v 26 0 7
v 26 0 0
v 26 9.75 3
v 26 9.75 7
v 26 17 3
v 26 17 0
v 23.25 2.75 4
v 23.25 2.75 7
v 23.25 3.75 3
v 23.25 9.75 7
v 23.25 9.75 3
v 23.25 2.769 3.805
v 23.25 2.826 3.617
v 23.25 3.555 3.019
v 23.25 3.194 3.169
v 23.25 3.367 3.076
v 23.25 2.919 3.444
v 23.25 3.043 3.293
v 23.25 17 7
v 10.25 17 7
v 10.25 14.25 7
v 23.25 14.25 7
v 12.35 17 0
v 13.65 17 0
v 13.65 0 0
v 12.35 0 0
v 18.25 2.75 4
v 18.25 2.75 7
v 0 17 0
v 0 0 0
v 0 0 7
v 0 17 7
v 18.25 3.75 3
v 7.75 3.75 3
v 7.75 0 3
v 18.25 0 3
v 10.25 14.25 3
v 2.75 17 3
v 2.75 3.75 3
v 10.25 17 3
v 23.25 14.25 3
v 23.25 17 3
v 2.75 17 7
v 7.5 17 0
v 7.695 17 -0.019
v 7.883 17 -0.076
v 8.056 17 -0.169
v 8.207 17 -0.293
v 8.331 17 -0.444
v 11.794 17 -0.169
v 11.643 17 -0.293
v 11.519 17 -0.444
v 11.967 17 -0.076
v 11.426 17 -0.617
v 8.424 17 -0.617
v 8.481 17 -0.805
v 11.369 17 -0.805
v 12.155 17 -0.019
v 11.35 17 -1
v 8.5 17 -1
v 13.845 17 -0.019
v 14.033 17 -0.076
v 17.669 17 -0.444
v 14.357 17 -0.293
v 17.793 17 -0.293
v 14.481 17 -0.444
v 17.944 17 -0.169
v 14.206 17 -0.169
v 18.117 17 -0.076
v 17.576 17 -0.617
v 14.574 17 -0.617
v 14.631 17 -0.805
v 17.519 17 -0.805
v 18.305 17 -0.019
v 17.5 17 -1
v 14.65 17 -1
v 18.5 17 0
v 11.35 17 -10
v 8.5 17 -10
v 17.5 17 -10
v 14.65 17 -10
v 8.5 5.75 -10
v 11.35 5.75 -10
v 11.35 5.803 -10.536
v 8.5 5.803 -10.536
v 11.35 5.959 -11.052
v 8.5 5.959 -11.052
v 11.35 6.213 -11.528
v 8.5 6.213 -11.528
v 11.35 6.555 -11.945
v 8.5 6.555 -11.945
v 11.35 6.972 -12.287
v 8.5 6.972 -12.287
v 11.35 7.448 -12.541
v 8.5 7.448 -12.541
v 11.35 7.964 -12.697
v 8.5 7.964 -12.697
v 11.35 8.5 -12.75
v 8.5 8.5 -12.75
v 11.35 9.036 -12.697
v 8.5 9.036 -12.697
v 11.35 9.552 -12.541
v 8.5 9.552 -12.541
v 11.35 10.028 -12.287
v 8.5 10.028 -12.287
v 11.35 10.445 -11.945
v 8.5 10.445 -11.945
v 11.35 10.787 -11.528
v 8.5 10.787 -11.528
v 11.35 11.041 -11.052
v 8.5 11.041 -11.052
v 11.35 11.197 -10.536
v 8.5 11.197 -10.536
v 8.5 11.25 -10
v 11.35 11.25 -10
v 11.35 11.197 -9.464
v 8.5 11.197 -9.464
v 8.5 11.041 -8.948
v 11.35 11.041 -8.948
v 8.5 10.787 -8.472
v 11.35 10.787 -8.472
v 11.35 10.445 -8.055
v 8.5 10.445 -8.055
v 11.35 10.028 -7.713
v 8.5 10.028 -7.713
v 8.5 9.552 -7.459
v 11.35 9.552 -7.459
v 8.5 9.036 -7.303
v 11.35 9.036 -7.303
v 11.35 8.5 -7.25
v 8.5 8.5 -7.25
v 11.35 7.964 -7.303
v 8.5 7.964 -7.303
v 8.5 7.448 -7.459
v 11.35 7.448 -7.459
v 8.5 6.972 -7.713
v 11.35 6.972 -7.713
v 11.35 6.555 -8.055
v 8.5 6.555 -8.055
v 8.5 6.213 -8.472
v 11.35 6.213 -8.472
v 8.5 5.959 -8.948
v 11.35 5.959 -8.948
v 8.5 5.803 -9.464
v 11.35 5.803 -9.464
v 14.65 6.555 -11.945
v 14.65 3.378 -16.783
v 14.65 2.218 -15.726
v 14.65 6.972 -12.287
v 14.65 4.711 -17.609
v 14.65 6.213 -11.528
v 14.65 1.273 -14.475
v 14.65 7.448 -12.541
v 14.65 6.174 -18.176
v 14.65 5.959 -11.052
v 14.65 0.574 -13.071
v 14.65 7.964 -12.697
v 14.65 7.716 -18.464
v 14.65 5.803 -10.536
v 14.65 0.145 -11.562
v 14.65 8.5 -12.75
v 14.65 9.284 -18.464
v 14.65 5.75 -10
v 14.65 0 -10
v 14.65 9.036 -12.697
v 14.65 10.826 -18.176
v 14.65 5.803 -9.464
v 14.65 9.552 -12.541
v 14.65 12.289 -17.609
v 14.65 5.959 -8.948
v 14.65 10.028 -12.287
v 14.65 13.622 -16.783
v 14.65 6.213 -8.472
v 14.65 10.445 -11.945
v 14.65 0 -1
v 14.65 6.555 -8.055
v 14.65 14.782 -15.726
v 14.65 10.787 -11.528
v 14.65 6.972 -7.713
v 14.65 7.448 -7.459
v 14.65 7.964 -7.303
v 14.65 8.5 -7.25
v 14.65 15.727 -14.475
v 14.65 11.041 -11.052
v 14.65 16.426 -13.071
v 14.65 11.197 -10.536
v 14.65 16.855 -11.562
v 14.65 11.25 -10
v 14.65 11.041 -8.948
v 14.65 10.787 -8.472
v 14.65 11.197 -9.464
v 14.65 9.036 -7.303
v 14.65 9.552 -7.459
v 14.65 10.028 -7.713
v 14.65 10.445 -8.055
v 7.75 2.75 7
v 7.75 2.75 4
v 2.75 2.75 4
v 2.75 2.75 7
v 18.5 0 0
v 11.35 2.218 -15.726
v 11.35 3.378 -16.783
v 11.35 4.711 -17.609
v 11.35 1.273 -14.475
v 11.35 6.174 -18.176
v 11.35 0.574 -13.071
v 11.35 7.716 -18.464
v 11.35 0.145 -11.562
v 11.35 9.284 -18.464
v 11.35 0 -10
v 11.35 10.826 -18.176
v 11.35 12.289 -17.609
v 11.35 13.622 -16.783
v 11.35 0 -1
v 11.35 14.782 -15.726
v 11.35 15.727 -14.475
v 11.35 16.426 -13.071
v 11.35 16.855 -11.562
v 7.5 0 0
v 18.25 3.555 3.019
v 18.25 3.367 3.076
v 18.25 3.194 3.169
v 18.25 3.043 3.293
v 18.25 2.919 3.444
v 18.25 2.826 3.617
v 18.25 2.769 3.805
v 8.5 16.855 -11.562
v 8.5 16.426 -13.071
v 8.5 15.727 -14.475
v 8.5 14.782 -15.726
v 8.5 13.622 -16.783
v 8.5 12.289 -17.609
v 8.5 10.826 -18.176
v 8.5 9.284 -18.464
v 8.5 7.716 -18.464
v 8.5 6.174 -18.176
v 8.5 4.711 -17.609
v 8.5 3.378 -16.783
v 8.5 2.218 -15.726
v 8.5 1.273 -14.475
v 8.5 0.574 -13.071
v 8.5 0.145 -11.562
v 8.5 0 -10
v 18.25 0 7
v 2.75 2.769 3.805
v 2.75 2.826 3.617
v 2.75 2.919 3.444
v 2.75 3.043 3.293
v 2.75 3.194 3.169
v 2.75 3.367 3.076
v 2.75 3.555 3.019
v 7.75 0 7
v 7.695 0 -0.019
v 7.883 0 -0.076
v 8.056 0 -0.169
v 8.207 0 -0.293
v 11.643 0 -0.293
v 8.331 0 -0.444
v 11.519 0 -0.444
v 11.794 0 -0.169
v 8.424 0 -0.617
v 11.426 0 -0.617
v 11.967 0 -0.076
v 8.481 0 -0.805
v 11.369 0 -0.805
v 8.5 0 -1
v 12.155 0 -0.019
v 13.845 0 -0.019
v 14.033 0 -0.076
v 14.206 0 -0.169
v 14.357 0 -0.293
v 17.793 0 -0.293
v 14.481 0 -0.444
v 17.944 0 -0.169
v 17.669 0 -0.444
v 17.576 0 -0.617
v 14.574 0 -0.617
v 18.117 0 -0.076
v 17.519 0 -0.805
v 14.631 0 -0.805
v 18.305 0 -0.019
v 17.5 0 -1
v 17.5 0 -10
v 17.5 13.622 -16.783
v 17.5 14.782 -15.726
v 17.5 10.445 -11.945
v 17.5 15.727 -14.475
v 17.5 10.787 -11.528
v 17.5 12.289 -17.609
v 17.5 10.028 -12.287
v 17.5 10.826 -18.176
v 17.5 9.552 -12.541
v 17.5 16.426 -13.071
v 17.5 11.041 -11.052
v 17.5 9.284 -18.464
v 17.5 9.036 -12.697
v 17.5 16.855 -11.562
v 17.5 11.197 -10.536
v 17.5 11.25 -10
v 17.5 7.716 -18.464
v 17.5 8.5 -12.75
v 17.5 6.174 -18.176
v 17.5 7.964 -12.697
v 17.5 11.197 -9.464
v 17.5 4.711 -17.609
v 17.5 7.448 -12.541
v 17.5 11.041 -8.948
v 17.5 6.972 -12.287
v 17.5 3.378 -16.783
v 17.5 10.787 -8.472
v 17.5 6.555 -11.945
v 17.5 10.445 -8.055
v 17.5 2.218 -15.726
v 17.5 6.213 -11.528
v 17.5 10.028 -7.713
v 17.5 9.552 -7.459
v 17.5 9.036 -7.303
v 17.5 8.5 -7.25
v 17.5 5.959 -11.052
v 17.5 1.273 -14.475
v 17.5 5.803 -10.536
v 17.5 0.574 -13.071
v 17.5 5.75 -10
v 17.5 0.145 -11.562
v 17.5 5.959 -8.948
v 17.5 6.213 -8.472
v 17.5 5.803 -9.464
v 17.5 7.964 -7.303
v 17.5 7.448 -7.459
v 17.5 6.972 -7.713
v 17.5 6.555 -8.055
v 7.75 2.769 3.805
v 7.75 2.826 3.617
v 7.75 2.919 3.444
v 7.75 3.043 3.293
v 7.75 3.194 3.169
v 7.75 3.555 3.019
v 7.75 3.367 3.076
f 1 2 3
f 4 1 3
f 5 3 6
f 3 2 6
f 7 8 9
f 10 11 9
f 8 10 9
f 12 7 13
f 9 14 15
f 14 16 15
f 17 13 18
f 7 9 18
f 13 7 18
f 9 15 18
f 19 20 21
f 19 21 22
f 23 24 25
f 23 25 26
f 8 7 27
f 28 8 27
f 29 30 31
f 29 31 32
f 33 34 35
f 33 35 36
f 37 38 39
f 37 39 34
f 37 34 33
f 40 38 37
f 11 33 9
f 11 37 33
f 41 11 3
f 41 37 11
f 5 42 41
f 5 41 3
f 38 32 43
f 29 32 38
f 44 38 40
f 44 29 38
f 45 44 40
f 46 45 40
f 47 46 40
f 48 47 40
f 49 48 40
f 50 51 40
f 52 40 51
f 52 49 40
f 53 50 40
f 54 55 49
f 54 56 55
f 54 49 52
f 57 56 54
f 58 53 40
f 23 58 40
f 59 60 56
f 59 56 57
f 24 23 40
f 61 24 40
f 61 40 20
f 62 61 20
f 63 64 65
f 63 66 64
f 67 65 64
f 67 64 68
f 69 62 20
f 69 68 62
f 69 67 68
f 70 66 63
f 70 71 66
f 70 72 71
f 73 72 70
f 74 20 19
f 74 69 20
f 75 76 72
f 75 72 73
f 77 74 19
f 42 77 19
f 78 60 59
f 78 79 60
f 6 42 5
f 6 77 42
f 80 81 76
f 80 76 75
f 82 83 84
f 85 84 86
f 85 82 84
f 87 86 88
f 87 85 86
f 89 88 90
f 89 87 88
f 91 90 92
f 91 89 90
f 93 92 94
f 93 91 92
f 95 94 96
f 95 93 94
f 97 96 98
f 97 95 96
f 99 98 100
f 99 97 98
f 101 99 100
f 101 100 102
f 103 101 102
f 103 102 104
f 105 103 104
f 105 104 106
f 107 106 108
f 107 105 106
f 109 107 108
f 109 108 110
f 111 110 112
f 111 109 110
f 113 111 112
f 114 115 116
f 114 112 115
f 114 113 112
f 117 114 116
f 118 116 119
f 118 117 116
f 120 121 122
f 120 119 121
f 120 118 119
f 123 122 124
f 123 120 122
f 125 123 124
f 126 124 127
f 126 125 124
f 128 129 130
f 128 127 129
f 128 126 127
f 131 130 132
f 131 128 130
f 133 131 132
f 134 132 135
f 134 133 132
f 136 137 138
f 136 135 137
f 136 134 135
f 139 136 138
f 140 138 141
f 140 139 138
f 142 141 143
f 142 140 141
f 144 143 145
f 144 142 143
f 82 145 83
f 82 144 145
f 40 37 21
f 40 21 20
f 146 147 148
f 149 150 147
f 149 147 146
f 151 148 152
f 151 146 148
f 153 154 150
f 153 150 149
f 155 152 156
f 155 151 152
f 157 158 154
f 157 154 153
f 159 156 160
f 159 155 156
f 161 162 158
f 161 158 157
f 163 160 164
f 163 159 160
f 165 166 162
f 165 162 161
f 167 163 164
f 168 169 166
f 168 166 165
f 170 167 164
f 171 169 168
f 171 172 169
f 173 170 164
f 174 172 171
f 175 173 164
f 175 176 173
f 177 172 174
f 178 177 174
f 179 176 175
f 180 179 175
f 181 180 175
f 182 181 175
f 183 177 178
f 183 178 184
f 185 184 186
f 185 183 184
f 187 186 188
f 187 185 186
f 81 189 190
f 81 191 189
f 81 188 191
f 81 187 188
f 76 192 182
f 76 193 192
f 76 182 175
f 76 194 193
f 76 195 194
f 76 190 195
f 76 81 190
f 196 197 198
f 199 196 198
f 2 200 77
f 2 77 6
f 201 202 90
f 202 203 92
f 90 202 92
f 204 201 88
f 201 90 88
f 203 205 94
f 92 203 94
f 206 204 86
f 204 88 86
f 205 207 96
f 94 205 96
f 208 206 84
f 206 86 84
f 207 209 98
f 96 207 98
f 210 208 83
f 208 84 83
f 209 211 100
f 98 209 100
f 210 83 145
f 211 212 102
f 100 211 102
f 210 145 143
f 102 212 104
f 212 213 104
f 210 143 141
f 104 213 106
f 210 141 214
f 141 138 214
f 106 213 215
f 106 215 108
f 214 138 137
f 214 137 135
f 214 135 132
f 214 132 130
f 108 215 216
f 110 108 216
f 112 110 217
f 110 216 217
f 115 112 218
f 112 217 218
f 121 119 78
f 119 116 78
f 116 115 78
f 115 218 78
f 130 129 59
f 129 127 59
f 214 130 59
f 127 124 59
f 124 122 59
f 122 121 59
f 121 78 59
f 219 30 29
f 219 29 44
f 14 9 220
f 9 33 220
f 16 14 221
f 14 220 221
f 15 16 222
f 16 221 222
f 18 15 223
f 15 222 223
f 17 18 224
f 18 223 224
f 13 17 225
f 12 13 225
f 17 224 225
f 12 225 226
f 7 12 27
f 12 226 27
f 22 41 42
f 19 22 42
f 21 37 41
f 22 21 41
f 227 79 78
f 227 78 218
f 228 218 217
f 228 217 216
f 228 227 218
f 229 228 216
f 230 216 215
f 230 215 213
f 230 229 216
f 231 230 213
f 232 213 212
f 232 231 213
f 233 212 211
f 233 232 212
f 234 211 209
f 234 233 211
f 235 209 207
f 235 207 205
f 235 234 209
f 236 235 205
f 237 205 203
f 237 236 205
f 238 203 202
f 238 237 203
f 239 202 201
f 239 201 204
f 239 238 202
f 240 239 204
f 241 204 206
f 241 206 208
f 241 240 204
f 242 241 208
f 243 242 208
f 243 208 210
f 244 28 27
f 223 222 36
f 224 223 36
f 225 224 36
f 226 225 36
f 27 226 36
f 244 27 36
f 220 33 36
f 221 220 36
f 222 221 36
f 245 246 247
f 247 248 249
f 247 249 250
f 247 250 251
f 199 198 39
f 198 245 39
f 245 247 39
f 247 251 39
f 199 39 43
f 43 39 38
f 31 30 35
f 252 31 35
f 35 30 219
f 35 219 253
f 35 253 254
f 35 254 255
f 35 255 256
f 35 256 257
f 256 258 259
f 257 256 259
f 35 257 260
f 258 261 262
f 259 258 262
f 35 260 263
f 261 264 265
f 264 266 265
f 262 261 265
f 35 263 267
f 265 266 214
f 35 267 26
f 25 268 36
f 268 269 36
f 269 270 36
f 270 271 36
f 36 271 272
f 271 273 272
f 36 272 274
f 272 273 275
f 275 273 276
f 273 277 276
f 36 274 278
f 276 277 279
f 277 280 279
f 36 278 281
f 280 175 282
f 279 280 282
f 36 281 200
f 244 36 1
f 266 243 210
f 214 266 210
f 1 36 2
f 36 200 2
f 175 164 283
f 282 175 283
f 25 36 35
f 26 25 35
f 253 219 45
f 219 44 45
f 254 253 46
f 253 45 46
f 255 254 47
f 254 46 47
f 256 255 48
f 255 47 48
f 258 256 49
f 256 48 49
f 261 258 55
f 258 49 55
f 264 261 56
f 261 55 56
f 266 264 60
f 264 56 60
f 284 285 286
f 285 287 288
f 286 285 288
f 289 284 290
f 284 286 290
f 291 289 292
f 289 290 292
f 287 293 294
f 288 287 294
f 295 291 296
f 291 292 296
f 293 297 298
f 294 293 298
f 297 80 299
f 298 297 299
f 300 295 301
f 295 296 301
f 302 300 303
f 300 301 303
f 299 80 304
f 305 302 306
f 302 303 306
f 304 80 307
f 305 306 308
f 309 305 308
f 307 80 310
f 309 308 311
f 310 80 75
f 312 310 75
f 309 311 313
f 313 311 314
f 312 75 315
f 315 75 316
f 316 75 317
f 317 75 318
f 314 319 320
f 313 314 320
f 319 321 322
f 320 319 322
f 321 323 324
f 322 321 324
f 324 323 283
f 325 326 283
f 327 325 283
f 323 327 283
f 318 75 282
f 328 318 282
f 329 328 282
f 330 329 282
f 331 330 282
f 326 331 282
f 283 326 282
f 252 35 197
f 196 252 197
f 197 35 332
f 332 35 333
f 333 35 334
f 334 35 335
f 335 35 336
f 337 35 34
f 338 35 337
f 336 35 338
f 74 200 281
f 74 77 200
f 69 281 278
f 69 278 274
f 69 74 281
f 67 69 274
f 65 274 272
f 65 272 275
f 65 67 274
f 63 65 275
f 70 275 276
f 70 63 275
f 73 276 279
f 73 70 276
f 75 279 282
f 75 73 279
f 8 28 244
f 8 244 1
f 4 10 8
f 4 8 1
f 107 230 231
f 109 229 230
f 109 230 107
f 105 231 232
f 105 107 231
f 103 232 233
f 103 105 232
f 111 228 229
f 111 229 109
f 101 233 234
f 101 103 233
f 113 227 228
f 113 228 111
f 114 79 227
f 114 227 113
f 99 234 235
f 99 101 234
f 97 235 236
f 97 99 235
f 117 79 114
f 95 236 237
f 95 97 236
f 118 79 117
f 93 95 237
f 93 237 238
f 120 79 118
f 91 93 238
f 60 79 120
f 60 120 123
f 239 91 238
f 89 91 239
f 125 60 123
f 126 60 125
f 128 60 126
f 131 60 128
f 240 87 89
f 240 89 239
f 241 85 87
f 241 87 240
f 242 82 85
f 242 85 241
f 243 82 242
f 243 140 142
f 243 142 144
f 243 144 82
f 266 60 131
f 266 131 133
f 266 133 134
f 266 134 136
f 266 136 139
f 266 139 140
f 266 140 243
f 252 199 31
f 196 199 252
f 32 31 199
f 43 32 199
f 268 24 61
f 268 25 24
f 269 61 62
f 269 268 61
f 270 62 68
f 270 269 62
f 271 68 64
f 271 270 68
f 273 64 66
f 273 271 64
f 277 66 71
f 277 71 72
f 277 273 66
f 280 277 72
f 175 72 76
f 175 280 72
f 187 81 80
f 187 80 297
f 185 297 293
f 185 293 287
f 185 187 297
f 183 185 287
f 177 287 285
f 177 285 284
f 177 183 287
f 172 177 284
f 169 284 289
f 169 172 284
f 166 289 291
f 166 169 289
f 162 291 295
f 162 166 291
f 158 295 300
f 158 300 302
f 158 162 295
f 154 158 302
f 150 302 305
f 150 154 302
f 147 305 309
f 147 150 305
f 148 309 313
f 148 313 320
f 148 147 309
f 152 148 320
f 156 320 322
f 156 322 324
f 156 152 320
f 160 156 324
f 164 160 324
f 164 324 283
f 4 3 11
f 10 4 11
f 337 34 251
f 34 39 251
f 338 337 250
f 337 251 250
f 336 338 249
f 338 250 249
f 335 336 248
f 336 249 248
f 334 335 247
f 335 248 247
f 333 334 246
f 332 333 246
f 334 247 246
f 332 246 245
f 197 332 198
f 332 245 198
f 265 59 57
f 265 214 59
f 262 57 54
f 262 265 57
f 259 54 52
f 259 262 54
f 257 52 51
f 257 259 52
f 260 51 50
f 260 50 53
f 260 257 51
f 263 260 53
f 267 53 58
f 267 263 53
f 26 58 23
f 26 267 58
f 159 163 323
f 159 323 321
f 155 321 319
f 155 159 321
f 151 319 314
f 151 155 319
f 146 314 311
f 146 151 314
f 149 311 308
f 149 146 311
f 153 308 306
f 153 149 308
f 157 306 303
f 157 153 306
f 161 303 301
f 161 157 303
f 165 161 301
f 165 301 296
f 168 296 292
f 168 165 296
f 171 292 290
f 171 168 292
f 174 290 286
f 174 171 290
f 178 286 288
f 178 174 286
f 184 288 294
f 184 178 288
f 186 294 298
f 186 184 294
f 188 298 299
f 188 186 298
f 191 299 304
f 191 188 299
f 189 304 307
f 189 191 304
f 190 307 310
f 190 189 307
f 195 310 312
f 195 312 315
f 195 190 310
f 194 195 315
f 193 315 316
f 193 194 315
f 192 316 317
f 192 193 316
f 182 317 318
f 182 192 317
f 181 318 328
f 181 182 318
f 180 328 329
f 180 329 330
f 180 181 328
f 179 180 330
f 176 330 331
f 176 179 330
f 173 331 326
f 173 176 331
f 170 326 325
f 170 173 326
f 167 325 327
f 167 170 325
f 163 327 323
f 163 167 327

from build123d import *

# Parameters (mm, degrees)
F0_W     = 26
F0_H     = 17
F1_DEPTH = 3
F2_W     = 13
F2_H     = 2.75
F3_DEPTH = 4
F7_DEPTH = 4.5
F8_W     = 3.3
F8_H     = 20.4774261328
F9_DEPTH = 25
F10_R    = 1


with BuildPart() as f1:
    # F0 (on Top) → F1 (new body)
    with BuildSketch(Plane.XY):
        with Locations((13, 8.5)):
            Rectangle(F0_W, F0_H)
    extrude(amount=F1_DEPTH)

    # F2 (on face) → F3 (join)
    with BuildSketch(Plane.XY.offset(3)):
        Polygon((26, 0), (26, 9.75), (23.25, 9.75), (23.25, 2.75), (18.25, 2.75), (18.25, 0), align=None)
        with Locations((16.75, 15.625)):
            Rectangle(F2_W, F2_H)
        Polygon((2.75, 17), (0, 17), (0, 0), (7.75, 0), (7.75, 2.75), (2.75, 2.75), align=None)
    extrude(amount=F3_DEPTH)

    # F6 (on plane+point) → F7 (join, symmetric)
    with BuildSketch(Plane(origin=(13, 0, 0), x_dir=(0, -1, 0), z_dir=(-1, 0, 0))):
        with BuildLine():
            Line((0, -10), (0, 0))
            Line((0, 0), (-17, 0))
            Line((-17, 0), (-17, -10))
            ThreePointArc((-17, -10), (-8.5, -1.5), (0, -10))
        make_face()
        with BuildLine():
            ThreePointArc((-17, -10), (-8.5, -18.5), (0, -10))
            Line((0, -10), (-5.75, -10))
            ThreePointArc((-5.75, -10), (-8.5, -12.75), (-11.25, -10))
            Line((-11.25, -10), (-17, -10))
        make_face()
        with BuildLine():
            Line((-5.75, -10), (0, -10))
            ThreePointArc((0, -10), (-8.5, -1.5), (-17, -10))
            Line((-17, -10), (-11.25, -10))
            ThreePointArc((-11.25, -10), (-8.5, -7.25), (-5.75, -10))
        make_face()
    extrude(amount=F7_DEPTH, both=True)

    # F8 (on face) → F9 (cut)
    with BuildSketch(Plane(origin=(0, 17, 0), x_dir=(-1, 0, 0), z_dir=(0, 1, 0))):
        with Locations((-13, -10.2387130664)):
            Rectangle(F8_W, F8_H)
    extrude(amount=-F9_DEPTH, mode=Mode.SUBTRACT)

    # F10
    f10_edges = [f1.edges().sort_by_distance(p)[0] for p in [
        (20.75, 2.75, 3),
        (5.25, 2.75, 3),
        (8.5, 8.5, 0),
        (17.5, 8.5, 0),
        (14.65, 8.5, 0),
        (11.35, 8.5, 0),
    ]]
    fillet(f10_edges, radius=F10_R)


solid = f1.part
